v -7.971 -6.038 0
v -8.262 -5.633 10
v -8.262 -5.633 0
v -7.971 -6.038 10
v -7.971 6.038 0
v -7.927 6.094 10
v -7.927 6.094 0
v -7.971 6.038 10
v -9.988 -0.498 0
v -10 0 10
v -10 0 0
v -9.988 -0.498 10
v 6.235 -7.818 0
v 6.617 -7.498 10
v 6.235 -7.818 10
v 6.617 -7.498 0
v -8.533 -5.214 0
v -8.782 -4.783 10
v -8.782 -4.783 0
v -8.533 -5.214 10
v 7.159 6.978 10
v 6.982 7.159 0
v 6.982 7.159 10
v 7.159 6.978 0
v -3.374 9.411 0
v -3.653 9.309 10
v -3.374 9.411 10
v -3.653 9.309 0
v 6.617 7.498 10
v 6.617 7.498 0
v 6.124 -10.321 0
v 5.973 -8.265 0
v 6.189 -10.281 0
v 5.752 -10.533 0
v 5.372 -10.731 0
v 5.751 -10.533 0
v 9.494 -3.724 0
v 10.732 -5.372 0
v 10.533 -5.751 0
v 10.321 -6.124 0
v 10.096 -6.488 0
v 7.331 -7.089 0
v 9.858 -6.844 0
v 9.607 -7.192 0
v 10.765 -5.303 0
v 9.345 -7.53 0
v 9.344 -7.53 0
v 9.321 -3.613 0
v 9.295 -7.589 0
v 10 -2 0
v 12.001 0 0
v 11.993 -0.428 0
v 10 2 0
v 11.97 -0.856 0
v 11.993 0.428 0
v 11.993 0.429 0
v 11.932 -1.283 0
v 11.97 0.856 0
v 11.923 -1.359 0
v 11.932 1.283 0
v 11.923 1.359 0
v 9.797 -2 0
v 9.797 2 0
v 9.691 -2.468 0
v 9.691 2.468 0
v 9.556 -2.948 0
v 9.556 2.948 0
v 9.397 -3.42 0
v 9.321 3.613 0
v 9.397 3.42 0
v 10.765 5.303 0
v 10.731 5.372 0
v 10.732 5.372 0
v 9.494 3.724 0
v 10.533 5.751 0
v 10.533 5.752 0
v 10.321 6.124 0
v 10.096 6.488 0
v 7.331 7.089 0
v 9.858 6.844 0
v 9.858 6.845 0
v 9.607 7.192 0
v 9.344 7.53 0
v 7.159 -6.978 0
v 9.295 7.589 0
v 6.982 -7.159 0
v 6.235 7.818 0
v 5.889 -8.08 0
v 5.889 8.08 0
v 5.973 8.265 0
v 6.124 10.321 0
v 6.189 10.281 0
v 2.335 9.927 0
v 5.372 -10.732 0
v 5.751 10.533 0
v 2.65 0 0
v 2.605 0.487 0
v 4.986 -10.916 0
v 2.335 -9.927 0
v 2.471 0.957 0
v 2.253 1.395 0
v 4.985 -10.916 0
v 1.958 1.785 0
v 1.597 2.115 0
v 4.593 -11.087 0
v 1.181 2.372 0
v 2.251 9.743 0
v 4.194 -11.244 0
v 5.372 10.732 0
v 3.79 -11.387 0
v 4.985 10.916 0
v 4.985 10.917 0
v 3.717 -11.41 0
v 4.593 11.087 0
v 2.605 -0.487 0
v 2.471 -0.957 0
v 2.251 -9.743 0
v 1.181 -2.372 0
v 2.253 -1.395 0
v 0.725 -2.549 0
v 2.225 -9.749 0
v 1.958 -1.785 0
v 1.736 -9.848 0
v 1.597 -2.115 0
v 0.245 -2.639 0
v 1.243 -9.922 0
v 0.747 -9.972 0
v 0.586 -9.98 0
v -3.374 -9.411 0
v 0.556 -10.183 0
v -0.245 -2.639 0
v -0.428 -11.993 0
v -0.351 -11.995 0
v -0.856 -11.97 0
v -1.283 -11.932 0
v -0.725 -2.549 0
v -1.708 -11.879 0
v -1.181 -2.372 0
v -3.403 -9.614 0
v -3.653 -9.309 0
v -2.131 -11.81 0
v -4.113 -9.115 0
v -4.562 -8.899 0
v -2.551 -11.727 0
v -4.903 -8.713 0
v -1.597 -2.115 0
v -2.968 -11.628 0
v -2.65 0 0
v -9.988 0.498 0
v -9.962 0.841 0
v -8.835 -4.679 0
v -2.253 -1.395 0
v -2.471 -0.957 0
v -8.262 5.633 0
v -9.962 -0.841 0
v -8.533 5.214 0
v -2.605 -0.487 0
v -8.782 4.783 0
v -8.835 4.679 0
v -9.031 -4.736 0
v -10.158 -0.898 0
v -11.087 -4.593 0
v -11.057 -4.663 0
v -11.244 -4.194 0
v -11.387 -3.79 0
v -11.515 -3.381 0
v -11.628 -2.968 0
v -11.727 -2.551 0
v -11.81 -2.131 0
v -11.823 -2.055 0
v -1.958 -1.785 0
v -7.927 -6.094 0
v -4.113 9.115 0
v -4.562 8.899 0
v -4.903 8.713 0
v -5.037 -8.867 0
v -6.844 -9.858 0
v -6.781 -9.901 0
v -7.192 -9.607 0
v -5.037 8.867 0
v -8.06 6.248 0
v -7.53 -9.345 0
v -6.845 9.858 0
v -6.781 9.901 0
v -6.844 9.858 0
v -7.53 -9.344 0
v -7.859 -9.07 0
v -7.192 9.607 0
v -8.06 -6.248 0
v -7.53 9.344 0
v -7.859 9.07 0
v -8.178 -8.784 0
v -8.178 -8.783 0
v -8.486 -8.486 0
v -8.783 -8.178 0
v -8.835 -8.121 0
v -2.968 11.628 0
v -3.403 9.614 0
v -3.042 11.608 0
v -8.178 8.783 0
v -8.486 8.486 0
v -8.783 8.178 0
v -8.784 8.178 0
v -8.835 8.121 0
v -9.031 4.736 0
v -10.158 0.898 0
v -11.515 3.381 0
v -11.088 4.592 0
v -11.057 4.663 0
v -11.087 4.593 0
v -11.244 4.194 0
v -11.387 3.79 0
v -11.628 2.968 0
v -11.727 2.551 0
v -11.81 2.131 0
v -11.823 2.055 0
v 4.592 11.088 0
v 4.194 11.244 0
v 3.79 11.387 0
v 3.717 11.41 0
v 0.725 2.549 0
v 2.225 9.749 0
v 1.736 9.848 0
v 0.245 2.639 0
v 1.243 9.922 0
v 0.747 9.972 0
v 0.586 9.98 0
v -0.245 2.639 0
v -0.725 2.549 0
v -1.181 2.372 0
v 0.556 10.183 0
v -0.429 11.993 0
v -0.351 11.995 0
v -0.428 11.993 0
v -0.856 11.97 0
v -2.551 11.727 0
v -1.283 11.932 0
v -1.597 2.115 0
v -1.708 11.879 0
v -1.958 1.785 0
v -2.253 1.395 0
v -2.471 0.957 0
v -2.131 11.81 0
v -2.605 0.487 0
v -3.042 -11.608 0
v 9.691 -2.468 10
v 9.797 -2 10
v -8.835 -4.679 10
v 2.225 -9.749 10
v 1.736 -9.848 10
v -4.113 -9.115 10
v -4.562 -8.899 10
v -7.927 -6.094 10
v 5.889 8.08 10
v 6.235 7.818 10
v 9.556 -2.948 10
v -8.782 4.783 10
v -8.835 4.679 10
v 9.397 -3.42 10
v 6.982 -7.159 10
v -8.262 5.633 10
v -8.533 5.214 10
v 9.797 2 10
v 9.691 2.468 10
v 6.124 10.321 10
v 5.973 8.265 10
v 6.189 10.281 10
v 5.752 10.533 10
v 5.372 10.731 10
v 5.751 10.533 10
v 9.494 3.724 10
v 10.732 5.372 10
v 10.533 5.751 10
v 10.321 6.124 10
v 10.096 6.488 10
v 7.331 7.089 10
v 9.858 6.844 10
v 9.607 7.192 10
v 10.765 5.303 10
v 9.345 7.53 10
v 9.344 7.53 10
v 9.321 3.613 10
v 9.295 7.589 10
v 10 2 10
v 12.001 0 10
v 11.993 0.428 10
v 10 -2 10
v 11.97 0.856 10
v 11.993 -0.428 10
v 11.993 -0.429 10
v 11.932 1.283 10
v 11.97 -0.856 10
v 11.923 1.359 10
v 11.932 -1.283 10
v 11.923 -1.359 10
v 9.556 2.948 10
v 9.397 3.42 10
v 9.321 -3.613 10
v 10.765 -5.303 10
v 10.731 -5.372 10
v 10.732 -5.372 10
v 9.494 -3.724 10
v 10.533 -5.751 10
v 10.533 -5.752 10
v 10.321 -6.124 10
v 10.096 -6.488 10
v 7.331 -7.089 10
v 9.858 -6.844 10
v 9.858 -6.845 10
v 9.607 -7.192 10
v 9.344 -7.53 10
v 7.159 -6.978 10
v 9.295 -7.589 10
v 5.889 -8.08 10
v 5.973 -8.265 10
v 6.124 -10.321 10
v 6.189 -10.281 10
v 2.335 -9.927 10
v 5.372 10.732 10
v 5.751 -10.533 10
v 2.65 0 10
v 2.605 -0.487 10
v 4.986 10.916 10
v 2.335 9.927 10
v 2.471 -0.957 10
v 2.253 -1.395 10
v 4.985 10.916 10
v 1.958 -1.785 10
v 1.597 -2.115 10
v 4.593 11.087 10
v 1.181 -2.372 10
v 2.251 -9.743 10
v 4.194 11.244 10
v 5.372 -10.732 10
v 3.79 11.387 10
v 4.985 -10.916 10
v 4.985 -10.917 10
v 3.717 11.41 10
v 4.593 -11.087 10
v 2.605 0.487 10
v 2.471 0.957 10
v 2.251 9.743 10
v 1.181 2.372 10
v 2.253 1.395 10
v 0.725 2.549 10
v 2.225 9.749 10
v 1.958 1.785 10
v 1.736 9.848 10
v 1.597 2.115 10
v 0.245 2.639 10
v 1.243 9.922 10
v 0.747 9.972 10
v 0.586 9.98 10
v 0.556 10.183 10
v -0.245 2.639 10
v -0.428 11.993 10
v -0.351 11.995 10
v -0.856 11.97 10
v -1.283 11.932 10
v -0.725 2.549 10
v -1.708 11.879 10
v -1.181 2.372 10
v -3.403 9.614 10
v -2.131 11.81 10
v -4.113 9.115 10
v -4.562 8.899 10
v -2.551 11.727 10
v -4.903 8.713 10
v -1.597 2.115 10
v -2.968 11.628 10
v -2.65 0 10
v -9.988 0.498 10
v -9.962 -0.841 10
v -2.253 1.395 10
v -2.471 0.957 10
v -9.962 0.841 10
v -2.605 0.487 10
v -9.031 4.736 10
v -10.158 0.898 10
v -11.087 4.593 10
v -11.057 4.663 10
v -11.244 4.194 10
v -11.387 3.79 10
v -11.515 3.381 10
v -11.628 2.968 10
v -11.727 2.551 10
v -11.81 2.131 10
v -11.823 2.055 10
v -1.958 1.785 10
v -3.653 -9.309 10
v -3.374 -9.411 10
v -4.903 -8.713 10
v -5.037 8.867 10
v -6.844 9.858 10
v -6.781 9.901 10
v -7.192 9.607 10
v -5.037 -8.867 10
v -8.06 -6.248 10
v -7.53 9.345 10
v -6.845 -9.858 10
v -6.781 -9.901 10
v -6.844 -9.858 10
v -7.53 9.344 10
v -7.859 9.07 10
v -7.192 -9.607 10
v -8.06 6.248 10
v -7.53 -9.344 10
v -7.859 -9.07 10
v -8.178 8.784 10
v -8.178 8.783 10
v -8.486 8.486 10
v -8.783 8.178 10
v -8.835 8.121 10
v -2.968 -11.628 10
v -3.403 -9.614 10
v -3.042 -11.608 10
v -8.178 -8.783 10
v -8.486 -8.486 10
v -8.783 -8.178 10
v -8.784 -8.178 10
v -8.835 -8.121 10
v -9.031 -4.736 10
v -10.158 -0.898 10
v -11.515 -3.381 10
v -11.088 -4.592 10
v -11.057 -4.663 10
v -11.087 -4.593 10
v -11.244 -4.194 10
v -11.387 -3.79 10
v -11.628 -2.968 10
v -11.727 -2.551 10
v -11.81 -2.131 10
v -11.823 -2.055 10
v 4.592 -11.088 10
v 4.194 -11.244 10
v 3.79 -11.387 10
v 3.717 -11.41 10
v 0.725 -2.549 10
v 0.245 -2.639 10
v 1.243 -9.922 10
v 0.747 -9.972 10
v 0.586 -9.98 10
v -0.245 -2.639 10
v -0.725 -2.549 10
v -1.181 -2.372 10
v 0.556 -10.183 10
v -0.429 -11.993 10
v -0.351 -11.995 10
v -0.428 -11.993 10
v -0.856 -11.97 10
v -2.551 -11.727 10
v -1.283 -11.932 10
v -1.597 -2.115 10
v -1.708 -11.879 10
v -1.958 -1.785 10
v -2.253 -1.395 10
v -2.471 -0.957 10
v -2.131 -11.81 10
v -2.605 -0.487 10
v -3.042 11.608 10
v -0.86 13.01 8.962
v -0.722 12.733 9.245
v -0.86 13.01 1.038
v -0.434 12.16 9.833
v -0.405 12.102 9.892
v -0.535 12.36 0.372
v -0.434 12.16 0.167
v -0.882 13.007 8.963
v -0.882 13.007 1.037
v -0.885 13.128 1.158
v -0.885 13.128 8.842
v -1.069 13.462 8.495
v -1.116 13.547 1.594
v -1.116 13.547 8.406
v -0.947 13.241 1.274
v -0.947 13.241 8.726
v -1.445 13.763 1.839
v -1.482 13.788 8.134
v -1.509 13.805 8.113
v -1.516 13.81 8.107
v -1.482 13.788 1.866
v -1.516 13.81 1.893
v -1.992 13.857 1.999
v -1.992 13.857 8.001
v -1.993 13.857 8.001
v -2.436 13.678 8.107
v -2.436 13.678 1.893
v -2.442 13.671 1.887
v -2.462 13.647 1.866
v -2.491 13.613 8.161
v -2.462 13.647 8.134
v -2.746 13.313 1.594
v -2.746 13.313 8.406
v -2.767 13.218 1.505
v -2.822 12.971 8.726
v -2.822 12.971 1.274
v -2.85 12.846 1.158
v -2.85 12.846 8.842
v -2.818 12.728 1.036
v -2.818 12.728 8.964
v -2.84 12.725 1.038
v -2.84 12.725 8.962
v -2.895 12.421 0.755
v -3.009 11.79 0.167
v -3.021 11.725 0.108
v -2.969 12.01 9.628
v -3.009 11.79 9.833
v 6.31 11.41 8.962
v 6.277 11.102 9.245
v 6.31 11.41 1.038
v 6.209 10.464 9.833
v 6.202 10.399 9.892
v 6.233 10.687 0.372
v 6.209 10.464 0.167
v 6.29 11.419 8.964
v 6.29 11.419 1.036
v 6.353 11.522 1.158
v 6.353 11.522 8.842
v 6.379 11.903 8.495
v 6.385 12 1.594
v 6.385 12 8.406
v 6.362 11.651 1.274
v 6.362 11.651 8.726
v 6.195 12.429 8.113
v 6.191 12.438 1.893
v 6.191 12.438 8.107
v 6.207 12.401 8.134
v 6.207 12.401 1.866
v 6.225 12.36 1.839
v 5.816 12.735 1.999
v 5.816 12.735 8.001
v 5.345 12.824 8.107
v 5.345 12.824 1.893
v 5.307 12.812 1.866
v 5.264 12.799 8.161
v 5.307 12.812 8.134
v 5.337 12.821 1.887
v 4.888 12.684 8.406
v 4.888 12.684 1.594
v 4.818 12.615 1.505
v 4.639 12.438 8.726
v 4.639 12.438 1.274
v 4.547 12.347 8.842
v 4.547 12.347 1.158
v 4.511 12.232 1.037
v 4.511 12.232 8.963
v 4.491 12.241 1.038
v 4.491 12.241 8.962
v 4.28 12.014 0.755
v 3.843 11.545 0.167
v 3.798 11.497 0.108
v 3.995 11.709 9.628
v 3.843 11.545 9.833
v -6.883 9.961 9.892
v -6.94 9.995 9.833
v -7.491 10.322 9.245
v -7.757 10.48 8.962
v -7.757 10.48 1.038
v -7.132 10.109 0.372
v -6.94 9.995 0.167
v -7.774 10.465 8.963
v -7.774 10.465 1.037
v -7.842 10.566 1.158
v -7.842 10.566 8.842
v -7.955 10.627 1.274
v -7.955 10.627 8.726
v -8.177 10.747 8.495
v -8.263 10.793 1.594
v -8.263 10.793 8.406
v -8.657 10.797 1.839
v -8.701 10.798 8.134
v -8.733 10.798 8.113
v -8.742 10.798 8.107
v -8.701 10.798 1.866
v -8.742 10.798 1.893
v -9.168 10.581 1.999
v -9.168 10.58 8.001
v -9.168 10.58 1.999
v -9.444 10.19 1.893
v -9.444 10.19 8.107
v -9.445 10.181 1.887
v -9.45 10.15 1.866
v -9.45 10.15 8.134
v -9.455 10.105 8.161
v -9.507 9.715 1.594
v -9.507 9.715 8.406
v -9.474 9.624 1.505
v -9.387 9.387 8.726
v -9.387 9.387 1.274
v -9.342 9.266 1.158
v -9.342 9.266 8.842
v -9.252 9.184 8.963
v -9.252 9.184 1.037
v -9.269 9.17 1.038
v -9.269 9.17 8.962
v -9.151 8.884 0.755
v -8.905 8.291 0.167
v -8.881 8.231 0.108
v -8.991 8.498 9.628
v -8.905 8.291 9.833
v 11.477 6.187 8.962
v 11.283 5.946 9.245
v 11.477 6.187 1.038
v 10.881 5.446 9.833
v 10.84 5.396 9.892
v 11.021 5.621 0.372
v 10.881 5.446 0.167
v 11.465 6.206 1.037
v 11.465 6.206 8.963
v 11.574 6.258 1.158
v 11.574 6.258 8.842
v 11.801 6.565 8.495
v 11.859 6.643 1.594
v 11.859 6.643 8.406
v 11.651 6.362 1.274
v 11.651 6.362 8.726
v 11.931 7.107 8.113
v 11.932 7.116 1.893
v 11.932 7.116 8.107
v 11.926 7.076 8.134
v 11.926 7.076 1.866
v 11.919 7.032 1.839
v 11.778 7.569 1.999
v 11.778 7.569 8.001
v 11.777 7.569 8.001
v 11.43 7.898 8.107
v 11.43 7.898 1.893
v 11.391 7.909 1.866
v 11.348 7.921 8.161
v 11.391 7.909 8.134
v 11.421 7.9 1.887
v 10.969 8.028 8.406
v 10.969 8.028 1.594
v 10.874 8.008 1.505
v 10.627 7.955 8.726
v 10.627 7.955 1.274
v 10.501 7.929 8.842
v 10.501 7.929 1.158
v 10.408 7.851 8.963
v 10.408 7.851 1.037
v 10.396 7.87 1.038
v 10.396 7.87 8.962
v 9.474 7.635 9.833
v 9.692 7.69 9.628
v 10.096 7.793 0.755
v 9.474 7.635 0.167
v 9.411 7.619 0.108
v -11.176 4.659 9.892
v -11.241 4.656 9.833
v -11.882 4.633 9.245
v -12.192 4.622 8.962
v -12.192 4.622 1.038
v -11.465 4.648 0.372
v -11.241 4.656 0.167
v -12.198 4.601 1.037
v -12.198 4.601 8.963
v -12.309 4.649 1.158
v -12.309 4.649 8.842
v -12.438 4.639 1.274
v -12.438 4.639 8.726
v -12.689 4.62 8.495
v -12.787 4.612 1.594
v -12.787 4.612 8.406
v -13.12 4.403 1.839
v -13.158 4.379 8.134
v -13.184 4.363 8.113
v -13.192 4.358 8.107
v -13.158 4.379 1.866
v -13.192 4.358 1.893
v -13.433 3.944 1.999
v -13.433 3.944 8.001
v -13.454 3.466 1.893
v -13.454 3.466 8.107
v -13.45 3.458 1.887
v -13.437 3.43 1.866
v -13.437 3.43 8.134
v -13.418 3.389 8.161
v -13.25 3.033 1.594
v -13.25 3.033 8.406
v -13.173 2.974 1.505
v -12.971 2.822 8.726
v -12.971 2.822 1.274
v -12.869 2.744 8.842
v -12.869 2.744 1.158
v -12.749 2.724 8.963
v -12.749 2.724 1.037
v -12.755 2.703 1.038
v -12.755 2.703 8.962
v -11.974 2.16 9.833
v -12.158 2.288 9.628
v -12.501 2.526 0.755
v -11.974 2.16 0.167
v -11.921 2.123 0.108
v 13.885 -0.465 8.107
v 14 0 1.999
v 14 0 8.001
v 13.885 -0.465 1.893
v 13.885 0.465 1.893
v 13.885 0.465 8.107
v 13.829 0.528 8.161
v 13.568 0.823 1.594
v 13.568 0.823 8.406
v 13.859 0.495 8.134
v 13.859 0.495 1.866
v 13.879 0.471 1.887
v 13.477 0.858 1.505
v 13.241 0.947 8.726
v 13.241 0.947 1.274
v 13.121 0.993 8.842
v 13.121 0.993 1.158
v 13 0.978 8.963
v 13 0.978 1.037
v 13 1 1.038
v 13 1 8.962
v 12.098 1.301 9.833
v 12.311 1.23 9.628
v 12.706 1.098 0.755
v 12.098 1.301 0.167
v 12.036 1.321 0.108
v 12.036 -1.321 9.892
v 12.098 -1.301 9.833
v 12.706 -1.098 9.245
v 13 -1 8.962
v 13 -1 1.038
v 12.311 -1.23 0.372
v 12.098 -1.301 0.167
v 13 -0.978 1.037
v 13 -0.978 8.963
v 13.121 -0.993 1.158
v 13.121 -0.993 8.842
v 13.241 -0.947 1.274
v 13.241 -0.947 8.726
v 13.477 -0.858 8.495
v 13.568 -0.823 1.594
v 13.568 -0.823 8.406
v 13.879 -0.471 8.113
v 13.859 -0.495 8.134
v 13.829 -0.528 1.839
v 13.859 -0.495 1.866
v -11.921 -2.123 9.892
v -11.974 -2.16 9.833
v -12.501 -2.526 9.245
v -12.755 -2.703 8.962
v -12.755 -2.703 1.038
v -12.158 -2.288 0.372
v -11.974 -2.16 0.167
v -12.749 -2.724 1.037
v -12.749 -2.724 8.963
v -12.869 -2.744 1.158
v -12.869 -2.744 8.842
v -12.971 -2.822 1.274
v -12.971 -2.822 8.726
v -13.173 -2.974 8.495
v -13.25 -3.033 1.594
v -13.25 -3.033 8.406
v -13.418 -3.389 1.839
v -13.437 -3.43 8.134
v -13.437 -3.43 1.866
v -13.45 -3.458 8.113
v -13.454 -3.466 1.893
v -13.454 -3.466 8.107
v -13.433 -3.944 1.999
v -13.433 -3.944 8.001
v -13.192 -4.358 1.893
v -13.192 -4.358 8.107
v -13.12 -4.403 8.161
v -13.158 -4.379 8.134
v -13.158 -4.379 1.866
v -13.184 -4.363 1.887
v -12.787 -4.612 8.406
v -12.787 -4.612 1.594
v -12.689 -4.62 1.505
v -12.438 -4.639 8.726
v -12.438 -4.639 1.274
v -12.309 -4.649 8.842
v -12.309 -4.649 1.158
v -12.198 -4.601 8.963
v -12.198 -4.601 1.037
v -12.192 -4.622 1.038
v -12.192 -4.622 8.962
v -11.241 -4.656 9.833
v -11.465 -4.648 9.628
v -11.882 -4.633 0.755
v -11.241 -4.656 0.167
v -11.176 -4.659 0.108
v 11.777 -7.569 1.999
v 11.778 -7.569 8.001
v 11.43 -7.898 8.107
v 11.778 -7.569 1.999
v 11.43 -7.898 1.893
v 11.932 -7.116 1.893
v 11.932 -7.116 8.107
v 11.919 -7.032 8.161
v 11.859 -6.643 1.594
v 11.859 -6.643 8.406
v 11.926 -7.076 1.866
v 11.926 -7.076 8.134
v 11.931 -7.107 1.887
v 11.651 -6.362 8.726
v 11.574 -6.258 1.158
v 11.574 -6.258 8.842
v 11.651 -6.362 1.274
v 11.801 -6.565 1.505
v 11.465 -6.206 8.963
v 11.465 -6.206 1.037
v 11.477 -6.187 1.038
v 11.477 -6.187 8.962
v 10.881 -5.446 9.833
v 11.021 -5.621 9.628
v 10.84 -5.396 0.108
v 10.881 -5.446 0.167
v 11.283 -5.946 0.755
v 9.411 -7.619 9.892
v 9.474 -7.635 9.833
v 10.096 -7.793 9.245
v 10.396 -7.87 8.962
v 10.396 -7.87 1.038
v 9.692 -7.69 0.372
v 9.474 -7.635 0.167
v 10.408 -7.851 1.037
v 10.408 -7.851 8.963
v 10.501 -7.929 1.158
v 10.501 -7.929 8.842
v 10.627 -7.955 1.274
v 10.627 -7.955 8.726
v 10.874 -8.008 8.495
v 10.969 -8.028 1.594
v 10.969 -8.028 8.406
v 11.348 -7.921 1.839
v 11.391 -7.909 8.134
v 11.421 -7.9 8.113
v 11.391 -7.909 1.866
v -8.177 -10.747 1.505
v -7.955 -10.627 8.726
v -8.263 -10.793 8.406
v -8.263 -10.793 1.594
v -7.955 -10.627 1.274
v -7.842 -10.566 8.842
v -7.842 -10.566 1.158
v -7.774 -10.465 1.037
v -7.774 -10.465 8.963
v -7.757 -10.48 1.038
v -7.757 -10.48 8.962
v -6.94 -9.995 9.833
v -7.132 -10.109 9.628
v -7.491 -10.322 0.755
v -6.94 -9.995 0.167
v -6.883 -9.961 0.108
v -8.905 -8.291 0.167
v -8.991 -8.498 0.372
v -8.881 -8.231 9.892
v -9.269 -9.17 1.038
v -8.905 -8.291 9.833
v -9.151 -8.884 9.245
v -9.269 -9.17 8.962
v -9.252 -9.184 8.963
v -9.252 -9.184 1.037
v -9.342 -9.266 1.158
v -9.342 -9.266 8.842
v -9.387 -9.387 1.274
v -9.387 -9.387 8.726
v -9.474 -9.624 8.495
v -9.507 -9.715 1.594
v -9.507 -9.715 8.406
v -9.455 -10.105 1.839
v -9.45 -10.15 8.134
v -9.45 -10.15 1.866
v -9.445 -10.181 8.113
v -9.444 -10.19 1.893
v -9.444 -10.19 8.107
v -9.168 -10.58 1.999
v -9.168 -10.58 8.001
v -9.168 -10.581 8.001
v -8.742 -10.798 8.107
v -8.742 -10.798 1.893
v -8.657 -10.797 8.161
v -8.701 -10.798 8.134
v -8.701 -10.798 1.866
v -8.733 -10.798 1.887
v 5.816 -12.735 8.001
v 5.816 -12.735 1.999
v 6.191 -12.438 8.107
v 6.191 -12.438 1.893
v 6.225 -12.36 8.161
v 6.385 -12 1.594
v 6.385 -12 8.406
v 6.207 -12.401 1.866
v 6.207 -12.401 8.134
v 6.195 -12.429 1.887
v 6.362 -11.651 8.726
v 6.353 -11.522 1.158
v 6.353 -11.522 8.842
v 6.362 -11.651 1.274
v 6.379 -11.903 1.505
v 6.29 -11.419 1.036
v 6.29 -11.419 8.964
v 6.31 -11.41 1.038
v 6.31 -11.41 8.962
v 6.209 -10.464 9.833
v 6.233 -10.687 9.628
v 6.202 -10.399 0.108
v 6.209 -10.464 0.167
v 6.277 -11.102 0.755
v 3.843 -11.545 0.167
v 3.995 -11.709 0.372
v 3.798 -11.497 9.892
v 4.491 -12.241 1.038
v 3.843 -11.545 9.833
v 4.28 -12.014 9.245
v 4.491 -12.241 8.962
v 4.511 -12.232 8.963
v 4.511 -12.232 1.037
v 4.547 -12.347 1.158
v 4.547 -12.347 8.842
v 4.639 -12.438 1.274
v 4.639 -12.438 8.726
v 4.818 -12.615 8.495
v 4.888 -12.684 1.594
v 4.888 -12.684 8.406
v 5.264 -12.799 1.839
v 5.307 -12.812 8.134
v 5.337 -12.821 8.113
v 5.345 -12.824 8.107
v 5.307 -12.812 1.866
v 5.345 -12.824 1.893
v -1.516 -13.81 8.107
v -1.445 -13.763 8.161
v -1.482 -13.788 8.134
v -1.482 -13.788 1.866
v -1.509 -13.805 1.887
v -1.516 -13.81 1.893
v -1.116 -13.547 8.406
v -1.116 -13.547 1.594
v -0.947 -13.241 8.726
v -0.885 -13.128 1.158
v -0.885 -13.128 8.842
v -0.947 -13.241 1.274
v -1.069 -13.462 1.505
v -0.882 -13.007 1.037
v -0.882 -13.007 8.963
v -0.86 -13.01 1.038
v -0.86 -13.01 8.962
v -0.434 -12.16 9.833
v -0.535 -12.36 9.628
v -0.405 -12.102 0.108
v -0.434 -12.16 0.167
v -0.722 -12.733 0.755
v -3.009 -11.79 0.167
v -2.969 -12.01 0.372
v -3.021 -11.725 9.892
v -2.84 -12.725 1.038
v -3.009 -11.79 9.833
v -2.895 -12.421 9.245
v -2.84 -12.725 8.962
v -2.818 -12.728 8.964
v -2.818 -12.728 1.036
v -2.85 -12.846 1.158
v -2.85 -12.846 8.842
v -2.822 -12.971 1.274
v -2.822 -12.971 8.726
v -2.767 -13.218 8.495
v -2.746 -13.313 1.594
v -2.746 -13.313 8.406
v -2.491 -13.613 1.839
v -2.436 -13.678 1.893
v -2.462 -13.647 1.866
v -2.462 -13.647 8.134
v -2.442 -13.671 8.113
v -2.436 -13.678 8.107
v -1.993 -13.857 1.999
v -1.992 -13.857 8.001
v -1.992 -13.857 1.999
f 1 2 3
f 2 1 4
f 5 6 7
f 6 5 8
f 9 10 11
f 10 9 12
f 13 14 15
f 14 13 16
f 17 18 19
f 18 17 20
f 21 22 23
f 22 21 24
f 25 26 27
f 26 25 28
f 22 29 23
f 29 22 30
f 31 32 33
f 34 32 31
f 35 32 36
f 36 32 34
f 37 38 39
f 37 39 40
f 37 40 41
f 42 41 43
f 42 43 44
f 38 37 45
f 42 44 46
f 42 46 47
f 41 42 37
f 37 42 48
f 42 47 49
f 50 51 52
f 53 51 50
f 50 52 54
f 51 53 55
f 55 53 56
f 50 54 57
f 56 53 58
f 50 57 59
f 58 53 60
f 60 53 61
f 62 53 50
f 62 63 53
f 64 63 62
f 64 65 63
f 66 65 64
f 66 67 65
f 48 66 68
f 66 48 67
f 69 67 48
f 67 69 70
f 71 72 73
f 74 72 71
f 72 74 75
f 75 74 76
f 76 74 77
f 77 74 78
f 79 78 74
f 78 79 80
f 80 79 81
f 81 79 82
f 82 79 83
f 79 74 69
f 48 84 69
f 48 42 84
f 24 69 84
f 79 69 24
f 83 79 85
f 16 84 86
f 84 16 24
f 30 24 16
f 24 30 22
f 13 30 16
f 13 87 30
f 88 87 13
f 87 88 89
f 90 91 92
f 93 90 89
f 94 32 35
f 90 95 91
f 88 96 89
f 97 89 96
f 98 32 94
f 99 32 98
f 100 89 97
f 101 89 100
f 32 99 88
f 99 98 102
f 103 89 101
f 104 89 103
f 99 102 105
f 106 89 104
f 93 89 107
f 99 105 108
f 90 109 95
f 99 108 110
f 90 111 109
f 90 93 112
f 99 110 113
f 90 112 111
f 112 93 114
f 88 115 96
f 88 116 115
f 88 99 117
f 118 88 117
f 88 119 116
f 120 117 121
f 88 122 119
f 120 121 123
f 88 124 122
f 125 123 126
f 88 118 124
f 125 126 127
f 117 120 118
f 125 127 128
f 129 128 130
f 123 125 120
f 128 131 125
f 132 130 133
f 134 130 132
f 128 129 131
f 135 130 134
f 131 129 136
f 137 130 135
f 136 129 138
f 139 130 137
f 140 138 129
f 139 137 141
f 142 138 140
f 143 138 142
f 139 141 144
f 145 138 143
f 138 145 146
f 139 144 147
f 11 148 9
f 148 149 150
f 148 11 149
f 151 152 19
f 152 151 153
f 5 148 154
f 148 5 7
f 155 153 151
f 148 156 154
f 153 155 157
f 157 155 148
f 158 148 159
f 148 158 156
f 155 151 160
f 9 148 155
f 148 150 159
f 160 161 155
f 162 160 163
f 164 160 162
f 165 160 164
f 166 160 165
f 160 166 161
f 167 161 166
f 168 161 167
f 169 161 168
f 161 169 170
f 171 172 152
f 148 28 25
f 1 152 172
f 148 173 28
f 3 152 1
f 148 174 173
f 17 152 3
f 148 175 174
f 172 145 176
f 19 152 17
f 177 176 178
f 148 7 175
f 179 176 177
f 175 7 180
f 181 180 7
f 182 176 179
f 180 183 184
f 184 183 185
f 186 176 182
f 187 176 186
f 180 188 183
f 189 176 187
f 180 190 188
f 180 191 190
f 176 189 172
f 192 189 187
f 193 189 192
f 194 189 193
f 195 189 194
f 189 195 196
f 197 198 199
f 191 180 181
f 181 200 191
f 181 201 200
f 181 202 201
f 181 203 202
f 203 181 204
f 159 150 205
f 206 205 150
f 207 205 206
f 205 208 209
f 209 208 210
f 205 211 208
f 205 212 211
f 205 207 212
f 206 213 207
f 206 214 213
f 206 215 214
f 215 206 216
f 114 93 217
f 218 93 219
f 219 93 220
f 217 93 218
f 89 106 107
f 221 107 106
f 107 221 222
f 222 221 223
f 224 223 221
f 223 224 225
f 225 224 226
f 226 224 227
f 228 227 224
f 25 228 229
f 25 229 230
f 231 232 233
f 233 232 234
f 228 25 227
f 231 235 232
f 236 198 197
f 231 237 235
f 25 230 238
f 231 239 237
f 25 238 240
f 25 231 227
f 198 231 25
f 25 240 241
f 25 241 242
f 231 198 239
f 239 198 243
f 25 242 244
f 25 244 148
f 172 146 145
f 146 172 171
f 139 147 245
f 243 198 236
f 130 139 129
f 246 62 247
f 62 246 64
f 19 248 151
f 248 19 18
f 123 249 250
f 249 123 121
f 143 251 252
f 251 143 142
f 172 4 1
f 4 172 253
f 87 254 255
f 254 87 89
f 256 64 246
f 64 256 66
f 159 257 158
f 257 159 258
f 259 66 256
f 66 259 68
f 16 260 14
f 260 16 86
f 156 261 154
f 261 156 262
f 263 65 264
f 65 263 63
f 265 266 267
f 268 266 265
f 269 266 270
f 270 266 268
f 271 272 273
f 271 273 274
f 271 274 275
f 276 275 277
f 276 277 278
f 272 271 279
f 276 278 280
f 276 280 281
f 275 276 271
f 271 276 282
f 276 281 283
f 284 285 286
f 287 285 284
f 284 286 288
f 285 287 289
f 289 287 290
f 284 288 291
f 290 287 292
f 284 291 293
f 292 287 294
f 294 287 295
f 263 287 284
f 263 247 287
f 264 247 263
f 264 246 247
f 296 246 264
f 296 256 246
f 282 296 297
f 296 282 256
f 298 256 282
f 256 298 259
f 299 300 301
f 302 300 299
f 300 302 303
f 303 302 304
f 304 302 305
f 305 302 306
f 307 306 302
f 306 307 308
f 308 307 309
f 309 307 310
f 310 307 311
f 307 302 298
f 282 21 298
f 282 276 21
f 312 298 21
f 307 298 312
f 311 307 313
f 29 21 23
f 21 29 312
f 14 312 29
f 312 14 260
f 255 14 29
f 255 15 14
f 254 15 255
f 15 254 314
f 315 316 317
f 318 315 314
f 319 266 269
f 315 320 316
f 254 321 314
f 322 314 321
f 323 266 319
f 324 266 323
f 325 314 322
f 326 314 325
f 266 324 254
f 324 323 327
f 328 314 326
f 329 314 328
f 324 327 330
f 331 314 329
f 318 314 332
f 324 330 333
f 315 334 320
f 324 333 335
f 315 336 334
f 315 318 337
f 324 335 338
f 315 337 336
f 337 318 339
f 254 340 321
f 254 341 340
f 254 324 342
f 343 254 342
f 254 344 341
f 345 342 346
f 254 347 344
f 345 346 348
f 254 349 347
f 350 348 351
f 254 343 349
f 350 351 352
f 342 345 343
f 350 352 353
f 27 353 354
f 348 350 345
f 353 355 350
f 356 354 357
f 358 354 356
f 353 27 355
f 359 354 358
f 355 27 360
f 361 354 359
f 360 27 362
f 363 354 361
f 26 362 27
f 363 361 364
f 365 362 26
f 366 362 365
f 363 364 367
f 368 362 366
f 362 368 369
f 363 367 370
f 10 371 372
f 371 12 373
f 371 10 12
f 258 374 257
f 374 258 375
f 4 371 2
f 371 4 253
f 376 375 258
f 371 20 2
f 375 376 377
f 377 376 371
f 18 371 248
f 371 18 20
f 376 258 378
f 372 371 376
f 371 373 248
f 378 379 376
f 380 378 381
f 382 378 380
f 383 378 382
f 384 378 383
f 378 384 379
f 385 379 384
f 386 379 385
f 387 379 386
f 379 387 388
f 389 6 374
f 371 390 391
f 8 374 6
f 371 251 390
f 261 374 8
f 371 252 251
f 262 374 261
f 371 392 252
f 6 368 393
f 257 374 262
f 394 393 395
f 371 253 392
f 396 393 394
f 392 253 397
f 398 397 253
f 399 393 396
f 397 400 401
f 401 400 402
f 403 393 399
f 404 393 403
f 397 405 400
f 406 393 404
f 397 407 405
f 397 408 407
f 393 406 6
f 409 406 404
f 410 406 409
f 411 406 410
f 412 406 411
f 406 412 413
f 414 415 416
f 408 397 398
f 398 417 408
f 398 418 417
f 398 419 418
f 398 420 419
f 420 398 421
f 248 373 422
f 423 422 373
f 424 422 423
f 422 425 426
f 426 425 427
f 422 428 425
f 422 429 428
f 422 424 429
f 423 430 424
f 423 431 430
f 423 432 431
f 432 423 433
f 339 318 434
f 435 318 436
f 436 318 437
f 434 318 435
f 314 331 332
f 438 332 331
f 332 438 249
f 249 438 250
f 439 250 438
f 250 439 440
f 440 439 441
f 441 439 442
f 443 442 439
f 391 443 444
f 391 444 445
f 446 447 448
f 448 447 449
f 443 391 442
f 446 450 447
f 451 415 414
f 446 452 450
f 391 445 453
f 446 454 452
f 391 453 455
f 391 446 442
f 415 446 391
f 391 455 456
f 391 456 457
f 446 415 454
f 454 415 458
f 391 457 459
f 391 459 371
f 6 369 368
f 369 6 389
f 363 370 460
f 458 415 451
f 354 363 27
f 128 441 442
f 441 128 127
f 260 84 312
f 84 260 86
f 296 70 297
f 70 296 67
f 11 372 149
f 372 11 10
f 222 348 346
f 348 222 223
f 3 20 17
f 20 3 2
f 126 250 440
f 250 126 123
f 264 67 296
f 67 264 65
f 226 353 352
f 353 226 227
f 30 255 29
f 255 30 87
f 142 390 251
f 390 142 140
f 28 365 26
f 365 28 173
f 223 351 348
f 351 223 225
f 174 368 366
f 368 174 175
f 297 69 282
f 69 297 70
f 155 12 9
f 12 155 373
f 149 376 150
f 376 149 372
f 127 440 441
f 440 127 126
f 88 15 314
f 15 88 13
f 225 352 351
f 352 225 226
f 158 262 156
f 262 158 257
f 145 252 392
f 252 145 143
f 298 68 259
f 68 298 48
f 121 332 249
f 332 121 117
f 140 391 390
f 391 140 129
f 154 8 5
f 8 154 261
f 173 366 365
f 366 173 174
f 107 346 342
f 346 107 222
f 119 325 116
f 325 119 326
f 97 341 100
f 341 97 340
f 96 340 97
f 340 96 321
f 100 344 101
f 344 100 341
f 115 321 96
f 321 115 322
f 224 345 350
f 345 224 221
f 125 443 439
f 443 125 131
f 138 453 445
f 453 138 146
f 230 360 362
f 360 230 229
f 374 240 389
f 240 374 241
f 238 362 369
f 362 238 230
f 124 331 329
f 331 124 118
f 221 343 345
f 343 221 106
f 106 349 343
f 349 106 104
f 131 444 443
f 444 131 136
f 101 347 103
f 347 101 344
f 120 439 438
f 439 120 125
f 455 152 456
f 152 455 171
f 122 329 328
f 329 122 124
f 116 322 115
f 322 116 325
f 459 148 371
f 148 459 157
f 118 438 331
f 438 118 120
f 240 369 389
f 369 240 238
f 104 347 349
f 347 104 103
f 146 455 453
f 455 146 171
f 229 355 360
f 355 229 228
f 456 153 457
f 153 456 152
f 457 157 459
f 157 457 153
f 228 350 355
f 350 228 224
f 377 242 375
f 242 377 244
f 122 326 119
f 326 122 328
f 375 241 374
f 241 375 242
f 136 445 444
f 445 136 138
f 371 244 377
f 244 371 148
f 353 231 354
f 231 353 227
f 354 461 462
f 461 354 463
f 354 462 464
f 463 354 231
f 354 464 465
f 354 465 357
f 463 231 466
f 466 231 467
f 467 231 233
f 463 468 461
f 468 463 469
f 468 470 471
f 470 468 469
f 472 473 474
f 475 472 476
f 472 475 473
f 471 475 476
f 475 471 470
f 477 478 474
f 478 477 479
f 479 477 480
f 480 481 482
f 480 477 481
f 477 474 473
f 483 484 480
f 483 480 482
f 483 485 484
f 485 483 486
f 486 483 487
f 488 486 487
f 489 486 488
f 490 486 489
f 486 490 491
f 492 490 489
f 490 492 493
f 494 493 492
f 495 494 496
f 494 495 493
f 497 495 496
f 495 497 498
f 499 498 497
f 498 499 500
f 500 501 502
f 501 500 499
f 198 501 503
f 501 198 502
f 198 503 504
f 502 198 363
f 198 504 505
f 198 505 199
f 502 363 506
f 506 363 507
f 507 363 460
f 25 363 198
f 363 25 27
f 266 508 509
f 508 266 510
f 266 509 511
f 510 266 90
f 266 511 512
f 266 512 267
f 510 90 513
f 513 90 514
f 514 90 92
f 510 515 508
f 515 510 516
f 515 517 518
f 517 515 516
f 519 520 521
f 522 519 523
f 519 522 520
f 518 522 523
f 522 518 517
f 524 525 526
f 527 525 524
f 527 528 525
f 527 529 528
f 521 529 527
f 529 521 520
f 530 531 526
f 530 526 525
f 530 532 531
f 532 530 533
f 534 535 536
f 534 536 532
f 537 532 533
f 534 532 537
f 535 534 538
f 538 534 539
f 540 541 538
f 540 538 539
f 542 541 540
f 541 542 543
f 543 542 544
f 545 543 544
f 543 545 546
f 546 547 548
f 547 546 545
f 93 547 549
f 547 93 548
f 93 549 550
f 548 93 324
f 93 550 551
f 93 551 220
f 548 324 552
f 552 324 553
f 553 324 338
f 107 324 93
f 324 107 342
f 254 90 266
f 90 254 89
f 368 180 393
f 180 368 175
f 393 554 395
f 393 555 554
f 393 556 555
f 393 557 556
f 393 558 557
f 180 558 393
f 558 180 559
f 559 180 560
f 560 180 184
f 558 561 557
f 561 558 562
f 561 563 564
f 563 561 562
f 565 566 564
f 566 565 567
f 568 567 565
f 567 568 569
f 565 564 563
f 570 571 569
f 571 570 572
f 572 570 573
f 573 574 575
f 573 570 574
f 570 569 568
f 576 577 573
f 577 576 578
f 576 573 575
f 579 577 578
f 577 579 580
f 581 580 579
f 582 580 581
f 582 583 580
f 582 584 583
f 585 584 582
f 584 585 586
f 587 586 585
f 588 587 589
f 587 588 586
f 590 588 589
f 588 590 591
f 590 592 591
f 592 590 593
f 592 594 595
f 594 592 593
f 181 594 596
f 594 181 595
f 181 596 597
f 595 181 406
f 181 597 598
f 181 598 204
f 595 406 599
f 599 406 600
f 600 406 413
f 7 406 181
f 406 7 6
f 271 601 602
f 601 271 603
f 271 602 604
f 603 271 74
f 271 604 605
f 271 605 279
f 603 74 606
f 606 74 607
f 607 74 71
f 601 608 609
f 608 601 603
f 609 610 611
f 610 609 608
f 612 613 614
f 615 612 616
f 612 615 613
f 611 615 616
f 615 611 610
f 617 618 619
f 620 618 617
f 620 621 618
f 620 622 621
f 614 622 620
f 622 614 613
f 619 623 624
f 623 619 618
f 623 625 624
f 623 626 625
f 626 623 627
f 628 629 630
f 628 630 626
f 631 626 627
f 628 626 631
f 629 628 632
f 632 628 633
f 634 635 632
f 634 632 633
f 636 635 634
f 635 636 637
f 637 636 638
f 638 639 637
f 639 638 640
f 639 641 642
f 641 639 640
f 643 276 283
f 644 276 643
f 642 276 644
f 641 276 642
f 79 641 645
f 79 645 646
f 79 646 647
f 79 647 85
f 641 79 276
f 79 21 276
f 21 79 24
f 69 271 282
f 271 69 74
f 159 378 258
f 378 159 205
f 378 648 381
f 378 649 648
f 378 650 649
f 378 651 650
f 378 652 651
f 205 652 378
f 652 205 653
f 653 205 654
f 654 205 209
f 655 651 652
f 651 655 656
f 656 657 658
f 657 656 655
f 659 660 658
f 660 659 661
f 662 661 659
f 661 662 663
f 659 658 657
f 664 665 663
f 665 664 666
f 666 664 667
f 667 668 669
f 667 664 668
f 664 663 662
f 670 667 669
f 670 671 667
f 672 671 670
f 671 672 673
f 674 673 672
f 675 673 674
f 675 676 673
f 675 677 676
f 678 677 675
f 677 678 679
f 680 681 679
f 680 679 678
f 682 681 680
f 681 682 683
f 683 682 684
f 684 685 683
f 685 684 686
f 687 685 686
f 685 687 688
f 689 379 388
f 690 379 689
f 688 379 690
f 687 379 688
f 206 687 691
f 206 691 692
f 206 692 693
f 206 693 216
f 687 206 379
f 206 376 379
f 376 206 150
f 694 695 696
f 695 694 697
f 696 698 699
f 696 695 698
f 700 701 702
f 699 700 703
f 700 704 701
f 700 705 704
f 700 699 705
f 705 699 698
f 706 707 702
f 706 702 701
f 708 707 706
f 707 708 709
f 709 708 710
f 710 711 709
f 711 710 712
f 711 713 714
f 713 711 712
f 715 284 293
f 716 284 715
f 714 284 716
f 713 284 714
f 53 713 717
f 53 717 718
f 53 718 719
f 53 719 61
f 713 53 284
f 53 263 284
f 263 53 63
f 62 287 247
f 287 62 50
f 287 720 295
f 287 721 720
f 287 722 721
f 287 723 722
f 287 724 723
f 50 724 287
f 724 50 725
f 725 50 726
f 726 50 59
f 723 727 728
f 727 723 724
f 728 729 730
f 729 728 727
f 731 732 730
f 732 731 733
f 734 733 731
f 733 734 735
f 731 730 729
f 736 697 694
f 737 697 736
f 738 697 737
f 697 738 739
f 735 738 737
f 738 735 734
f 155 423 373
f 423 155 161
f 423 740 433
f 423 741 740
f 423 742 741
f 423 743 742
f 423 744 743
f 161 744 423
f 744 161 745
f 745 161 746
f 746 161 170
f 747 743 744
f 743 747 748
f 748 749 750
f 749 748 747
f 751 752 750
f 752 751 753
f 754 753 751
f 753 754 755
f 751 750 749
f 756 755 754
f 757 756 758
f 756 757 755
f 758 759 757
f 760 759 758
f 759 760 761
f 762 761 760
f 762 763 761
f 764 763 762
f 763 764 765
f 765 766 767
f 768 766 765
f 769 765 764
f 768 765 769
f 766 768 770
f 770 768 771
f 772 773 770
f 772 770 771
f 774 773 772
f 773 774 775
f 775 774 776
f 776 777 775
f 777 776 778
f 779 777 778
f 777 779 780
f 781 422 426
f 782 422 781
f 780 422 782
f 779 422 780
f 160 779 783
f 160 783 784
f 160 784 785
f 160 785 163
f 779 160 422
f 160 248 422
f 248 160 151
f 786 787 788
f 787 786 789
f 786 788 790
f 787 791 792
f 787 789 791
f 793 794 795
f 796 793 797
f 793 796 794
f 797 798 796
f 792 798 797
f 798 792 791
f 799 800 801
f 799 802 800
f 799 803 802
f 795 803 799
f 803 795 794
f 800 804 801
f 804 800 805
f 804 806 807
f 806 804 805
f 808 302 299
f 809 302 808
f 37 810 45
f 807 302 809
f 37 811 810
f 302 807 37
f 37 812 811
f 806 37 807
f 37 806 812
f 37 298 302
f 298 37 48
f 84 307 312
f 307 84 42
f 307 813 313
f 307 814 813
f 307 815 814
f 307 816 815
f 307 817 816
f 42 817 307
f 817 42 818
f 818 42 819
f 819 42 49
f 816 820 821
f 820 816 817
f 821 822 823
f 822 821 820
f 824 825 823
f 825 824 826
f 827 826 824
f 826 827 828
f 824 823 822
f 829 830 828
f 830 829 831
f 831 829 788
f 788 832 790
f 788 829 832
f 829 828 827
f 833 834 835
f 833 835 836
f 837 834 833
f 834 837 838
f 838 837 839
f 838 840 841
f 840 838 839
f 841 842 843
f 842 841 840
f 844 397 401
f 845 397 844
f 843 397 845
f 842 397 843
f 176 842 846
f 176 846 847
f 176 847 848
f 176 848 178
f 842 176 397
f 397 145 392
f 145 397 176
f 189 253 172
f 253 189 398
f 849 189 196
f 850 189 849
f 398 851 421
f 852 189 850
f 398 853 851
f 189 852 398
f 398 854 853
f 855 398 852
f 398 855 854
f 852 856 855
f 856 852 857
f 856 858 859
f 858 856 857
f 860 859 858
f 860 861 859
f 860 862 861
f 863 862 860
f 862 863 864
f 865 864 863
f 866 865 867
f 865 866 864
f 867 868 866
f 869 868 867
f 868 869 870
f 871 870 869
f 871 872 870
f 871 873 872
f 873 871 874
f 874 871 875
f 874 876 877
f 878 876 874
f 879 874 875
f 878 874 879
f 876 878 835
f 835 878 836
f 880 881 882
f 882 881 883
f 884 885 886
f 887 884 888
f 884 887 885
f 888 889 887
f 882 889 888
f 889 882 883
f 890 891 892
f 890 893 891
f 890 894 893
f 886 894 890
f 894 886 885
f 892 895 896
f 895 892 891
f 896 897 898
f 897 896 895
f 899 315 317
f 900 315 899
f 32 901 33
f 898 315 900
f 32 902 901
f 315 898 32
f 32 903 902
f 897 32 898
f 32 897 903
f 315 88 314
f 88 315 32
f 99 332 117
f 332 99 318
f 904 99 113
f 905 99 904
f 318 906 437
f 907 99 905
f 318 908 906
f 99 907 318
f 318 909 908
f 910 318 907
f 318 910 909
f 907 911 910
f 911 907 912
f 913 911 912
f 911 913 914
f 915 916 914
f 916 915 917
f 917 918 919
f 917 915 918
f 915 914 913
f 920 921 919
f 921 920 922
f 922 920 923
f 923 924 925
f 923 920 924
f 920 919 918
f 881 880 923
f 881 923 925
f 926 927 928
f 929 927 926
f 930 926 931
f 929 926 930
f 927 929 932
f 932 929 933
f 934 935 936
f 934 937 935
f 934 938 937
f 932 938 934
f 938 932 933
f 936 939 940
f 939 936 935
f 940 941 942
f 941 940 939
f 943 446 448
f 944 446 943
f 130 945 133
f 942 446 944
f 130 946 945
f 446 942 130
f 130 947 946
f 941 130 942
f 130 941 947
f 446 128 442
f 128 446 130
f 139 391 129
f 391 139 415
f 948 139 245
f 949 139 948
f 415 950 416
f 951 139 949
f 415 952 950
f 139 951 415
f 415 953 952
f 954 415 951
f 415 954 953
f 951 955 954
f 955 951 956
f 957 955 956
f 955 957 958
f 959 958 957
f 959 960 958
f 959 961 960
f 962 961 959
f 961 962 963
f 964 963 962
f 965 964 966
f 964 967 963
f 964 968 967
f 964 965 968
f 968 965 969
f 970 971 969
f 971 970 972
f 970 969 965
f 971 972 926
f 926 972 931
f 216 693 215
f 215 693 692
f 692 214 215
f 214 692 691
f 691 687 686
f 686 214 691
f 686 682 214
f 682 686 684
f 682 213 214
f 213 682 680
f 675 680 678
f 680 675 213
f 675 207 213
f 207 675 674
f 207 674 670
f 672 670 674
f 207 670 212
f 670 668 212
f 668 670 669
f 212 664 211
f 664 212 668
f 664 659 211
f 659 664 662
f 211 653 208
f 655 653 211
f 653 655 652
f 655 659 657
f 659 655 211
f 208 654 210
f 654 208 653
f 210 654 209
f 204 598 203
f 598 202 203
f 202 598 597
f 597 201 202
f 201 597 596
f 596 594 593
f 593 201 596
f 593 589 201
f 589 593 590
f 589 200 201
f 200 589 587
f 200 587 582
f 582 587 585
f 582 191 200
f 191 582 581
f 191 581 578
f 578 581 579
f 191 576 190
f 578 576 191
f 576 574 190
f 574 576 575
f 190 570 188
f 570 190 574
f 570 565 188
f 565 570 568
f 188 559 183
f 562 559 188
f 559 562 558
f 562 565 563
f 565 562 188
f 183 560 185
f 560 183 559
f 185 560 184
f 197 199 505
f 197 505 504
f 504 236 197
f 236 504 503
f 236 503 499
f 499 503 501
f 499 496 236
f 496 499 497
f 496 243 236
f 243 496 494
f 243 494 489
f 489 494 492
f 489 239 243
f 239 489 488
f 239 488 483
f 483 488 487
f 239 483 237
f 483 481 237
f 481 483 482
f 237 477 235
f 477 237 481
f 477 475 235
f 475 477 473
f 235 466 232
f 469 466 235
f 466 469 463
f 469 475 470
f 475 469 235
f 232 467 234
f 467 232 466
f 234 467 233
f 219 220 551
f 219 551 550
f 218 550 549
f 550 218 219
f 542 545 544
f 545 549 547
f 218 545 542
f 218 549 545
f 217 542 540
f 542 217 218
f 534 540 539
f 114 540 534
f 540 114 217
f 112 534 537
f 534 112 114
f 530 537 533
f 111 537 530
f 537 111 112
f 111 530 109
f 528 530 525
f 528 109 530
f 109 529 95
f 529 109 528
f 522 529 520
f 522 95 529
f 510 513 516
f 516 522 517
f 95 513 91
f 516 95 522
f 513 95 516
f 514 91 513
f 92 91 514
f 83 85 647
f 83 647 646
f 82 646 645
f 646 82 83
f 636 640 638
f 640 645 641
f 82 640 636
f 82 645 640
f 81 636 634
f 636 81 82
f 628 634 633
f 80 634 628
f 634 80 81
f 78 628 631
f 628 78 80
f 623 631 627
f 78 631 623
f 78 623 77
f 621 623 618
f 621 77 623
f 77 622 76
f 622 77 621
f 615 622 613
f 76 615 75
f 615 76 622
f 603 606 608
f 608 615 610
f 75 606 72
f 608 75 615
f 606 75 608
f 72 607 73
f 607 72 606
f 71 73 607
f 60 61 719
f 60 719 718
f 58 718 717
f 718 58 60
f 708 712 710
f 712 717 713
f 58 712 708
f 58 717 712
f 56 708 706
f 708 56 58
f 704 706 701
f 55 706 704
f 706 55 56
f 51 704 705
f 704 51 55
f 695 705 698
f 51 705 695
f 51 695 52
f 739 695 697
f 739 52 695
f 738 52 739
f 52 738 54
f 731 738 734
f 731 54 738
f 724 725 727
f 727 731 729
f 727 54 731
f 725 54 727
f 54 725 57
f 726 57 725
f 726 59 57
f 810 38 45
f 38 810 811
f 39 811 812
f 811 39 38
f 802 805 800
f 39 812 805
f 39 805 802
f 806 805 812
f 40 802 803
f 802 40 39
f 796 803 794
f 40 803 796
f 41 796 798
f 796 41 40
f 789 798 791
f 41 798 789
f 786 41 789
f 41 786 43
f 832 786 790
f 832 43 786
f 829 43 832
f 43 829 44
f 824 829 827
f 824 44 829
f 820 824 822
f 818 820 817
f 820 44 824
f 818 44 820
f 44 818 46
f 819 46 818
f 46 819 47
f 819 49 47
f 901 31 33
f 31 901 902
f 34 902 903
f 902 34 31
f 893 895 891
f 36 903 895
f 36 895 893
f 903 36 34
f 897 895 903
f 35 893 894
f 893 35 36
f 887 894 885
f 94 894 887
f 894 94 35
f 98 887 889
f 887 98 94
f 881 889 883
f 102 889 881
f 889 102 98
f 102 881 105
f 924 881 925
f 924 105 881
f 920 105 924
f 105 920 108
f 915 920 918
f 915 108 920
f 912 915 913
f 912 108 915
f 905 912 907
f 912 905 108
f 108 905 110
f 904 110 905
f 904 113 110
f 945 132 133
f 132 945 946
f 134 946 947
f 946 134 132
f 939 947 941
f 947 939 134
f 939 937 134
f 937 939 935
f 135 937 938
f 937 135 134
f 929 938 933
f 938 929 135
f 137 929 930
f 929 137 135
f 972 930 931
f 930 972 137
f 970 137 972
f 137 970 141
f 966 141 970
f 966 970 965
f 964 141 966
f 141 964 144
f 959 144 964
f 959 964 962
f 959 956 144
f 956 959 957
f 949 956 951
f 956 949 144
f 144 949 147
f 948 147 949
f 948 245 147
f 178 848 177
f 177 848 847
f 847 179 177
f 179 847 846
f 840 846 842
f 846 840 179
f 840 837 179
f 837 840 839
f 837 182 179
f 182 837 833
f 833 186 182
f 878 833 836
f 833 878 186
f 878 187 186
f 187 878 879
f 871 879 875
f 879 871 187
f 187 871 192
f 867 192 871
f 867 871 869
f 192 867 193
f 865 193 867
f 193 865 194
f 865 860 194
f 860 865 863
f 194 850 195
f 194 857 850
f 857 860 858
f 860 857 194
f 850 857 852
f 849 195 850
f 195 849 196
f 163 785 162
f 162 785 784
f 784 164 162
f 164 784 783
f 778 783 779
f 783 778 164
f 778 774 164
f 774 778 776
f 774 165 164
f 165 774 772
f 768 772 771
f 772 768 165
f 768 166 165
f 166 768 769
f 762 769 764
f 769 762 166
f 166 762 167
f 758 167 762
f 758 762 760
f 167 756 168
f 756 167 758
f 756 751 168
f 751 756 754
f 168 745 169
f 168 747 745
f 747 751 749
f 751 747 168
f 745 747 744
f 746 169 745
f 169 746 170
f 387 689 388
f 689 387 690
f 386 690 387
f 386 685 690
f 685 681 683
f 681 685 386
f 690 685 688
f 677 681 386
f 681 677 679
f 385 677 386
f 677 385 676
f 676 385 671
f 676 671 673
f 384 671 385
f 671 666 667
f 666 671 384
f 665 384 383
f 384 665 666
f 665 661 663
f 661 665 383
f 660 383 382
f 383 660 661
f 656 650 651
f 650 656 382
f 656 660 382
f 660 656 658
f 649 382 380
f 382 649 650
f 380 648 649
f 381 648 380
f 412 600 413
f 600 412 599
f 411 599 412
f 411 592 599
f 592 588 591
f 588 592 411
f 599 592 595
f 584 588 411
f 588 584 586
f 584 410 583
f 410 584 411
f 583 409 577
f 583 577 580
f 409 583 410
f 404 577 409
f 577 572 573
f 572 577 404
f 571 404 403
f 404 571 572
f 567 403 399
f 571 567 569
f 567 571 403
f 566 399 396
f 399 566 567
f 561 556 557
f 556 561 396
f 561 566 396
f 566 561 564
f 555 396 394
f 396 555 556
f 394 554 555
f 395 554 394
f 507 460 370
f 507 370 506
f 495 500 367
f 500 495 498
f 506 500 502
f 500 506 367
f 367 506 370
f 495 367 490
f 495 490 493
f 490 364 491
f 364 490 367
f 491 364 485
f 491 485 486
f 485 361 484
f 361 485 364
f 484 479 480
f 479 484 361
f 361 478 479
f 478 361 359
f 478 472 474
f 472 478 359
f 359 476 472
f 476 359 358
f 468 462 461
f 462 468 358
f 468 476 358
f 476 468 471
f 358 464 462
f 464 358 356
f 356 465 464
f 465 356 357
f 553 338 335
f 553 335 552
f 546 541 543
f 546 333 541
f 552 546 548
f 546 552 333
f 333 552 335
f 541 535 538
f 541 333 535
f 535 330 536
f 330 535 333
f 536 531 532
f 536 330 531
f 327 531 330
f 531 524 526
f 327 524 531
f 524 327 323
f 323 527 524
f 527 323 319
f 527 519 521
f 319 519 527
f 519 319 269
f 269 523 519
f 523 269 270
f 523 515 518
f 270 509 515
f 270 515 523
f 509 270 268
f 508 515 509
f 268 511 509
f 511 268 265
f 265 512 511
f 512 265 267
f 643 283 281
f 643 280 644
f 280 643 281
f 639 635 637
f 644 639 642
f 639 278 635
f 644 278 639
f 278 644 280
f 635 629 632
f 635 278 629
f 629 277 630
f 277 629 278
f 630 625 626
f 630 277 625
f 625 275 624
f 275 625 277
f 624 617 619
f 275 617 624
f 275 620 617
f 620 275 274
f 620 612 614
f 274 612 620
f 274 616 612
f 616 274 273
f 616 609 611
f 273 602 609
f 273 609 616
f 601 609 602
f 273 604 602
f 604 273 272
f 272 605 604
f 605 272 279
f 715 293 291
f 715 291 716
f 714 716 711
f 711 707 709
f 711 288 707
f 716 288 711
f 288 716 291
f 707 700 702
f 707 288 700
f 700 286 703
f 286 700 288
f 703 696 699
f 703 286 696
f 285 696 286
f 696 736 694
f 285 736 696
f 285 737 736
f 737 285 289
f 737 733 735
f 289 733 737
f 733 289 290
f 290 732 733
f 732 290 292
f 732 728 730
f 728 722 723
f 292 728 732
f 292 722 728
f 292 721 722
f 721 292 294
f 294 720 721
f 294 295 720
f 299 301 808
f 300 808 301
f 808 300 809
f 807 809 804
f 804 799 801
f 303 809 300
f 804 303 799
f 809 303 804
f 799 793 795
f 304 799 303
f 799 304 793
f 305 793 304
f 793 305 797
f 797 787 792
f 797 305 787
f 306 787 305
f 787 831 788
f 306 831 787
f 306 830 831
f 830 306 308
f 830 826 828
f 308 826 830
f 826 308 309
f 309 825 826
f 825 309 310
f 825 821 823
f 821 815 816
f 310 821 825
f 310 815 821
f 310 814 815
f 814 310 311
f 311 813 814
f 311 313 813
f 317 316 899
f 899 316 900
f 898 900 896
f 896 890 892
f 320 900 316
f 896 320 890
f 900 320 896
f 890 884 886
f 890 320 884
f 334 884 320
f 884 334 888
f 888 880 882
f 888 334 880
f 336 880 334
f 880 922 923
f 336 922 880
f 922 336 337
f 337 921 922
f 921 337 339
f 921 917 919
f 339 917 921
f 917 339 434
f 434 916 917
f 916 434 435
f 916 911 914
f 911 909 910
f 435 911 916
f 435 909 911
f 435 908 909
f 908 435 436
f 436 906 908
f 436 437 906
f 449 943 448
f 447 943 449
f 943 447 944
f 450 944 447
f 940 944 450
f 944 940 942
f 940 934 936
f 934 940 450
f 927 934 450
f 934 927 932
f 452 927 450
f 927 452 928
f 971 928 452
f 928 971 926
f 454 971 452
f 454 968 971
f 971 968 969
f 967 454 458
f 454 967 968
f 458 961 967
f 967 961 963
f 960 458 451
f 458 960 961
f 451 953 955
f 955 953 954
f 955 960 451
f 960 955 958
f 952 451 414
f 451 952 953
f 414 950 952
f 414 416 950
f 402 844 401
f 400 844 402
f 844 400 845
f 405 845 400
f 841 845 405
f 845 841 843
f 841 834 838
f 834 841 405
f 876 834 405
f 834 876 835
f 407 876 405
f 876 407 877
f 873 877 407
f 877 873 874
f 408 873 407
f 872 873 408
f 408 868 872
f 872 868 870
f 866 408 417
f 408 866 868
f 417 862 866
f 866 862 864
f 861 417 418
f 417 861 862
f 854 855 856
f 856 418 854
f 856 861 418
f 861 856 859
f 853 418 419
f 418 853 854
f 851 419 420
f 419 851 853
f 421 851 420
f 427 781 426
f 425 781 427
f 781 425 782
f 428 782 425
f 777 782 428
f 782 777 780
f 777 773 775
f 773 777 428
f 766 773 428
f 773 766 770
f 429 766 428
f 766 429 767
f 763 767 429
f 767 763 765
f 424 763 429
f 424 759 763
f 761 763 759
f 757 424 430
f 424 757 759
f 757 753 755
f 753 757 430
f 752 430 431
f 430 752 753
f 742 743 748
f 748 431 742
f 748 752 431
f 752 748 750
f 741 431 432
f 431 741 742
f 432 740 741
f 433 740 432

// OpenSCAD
/******************************************************************************
 *
 *  GLOBALS
 *
 ******************************************************************************/


/* [General] */
gearType = 1; //[1: Regular gear, 2: Helix gear, 3: Double helix gear, 4: Herringbone gear]
// Radius from center to teeth base (!)
wheelRadius = 10;
outerThickness = 10;
innerThickness = 10;
// Inner/outer rings radius difference
outerRingThickness = 4;

/* [Inner Part] */
centerHole = 1; // [0: None, 1: Circular, 2: Hex]
// Not needed if no center hole
centerHoleDiameter = 5.3;

/* [Lightening Holes] */
lighteningHoles = 0; // [0: None, 1: Circular, 2: Wheelarm style]
// Not needed if no lightening holes
lighteningHolesCount = 0;
// Not needed if no lightening holes
lighteningHolesDistance = 0;
// Not needed if no lightening holes
lighteningHolesOuterDistance = 0;
// Needed only for wheelarm style holes
wheelarmHolerRoundness = 2;

/* [Teeth configuration] */
// Not needed for regular gear
herringboneAngle = 15; 
// Needed only for herringbone gear
herringboneSpaceWidth = 2;
teethCount = 11;
toothHeight = 4;
toothBaseWidth = 4;
toothEnd = 2; // [1: Flat, 2: Rounded]
// Also used as the primary dimension for tooth finish!
toothEndWidth = 2;
toothFinish = 2; // [0: None, 1: Rounded, 2: Bevel]

/* [Hidden] */
$fa = 1;
$fs = 0.5;


/******************************************************************************
 *
 *  EXECUTION
 *
 ******************************************************************************/


ringsPart();
teethPart();


/******************************************************************************
 *
 *  DIRECT MODULES
 *
 ******************************************************************************/


module teethPart()
{
    difference()
    {
        _teeth();
        _teethFinish();
    }
}

module ringsPart()
{
    difference()
    {
        _gearRings();
        union()
        {
            _centerHole();
            _lightening();
        }
    }
}


/******************************************************************************
 *
 *  HELPER AND COMPONENT MODULES
 *
 ******************************************************************************/

module _teethFinish()
{
    if(toothFinish > 0)
    {
        translate([0, 0, -0.001])
            rotate_extrude(convexity = 10)
                translate([wheelRadius + toothHeight - toothEndWidth, 0, 0])
                    _teethFinishShape();
        translate([0, 0, outerThickness + 0.001])
            rotate_extrude(convexity = 10)
                translate([wheelRadius + toothHeight - toothEndWidth, 0, 0])
                    mirror([0, 1, 0])
                        _teethFinishShape();

    }
}

module _teethFinishShape()
{
    if(toothFinish == 2)
    {
        difference()
        {
            square(toothEndWidth + 0.001);
            rotate([0, 0, 45])
                square(toothEndWidth * 2);
        }
    }
    else
    {
        difference()
        {
            square(toothEndWidth + 0.001);
            translate([0, toothEndWidth, 0])
                circle(toothEndWidth + 0.001);
        }
    }
}

module _teeth()
{
    if(gearType == 2)
    {
        _helixGear();
    }
    else if(gearType == 3)
    {
        _doubleHelixGear();
    }
    else if(gearType == 4)
    {
        _herringboneGear();
    }
    else
    {
        _regularGear();
    }
}

module _regularGear()
{
    _halfGear();
    translate([0, 0, outerThickness / 2]) 
        _halfGear();    
}

module _helixGear()
{
    _halfGear(herringboneAngle);
    translate([0, 0, outerThickness / 2])    
        rotate([0, 0, -herringboneAngle])
            _halfGear(herringboneAngle);
}

module _doubleHelixGear()
{
    _halfGear(-herringboneAngle);
    translate([0, 0, outerThickness / 2])    
        rotate([0, 0, herringboneAngle])
            _halfGear(herringboneAngle);
}

module _herringboneGear()
{
    difference()
    {
        _doubleHelixGear();
        _herringboneSpace();
    }   
}

module _minkowskiInside(mask = [9999, 9999]) // "Intel Inside"! No...
{
    minkowski()
    {
        difference()
        {
            square(mask, center = true);
            minkowski()
            {
                difference()
                {
                    square(mask, center = true);
                    children(0);
                }
                children(1);
            }
        }
        children(1);
    }
}


module _pie2d(angle, radius)
{
    if(angle > 90)
    {
        for(i = [1: 90: angle - (angle % 90)])
        {
            rotate([0, 0, i])
                _pie2d(90, radius);
        }
        
        rotate([0, 0, angle - (angle % 90)])
            _pie2d(angle % 90, radius);
    }
    else
    {
        rotate([0, 0, 90])
            intersection()
            {
                circle(radius);
                scale([2, 2, 1])
                    hull()
                    {
                        rotate([90, 0, 0])
                            square([radius, 44]); // no idea, why, but less than 10 kills OpenSCAD :)
                        rotate([90, 0, angle])
                            square([radius, 44]);
                    }
            }
    }
}


module _herringboneSpace()
{
        translate([0, 0, outerThickness / 2 - herringboneSpaceWidth / 2])
            difference()
                {
                    cylinder(r = wheelRadius + toothHeight + 4, h = herringboneSpaceWidth);
                    translate([0, 0, -1])
                        cylinder(r = wheelRadius - outerRingThickness / 2, h = herringboneSpaceWidth + 2);
                }
}

module _halfGear(twist = 0)
{
    linear_extrude(height = outerThickness / 2, twist = twist, convexity = 8)
        for(i = [0: 360 / teethCount: 360])
            rotate([0, 0, i])
                translate([wheelRadius, 0, 0])
                    _tooth();
}

module _tooth()
{
    union()
    {
        if(toothEnd == 1)
        {
            polygon([
                [0, toothBaseWidth / 2], [0, -toothBaseWidth / 2], [toothHeight, -toothEndWidth / 2], [toothHeight, toothEndWidth / 2]
            ]);
        }
        else
        {
            flatPartHeight = toothHeight - toothEndWidth / 2;
            union()
            {
                polygon([
                    [0, toothBaseWidth / 2], [0, -toothBaseWidth / 2], [flatPartHeight, -toothEndWidth / 2], [flatPartHeight, toothEndWidth / 2]
                ]);
                translate([flatPartHeight, 0, 0])
                    circle(toothEndWidth / 2);
            }
        }
        translate([-outerRingThickness/8, 0, 0])
            square([outerRingThickness/4, toothBaseWidth], center = true); // getting rid of freespaces the ugly-way
    }
}

module _lightening()
{
    if(lighteningHoles > 0)
    {
        angle = 360 / (lighteningHolesCount);
        for(i = [1 : lighteningHolesCount])
        {
            rotate([0, 0, angle * i])
            {
                if(lighteningHoles == 1)
                {
                    arm = wheelRadius - outerRingThickness;
                    // OMFG! It's been ages since I used trigonometry! 
                    holeRadius = arm * sin(angle / 2) / (1 + sin(angle / 2)) - lighteningHolesDistance / 4 - lighteningHolesOuterDistance / 2;
                    translate([wheelRadius - outerRingThickness - holeRadius - lighteningHolesOuterDistance, 0, 0])
                        cylinder(r = holeRadius, h = innerThickness + outerThickness, $fn = (lighteningHoles == 2 ? 3 : $fn));
                }      
                else
                {
                    innerRadius = wheelRadius - outerRingThickness - lighteningHolesOuterDistance;
                    distanceAngle = lighteningHolesDistance * 180 / (PI * innerRadius / 2);
                    linear_extrude(height = 40, convexity = 8)
                        _minkowskiInside()
                        {
                            difference()
                            {
                                difference()
                                {
                                    _pie2d(angle, innerRadius);
                                    circle(centerHoleDiameter / 2 + lighteningHolesDistance);
                                }
                                _pie2d(distanceAngle, innerRadius);
                            }
                            circle(wheelarmHolerRoundness);
                        }
                }
            }
        }
    }
}


module _centerHole()
{
    if(centerHole > 0)
    {
        translate([0, 0, -1])
            cylinder(r = centerHoleDiameter / 2, h = innerThickness + outerThickness, $fn = (centerHole == 2 ? 6 : $fn));
    }
}

module _gearRings()
{
    if(outerThickness > innerThickness)
    {
        difference()
        {
            _outerGear();
            _innerGearNegative();
        }
    }
    else 
    {
        _outerGear();
        if(outerThickness < innerThickness)
        {
            _innerGearPositive();
        }
    }
}

module _outerGear()
{
    cylinder(r = wheelRadius, h = outerThickness);
}

module _innerGearNegative()
{
        union()
        {
            translate([0, 0, (outerThickness - innerThickness) / 2 + innerThickness])
                cylinder(r = wheelRadius - outerRingThickness, h = outerThickness);
            translate([0, 0, -(outerThickness - innerThickness) / 2 - innerThickness])
                cylinder(r = wheelRadius - outerRingThickness, h = outerThickness);
        }    
}

module _innerGearPositive()
{
    translate([0, 0, (outerThickness - innerThickness) / 2])
        cylinder(r = wheelRadius - outerRingThickness, h = innerThickness);
}
